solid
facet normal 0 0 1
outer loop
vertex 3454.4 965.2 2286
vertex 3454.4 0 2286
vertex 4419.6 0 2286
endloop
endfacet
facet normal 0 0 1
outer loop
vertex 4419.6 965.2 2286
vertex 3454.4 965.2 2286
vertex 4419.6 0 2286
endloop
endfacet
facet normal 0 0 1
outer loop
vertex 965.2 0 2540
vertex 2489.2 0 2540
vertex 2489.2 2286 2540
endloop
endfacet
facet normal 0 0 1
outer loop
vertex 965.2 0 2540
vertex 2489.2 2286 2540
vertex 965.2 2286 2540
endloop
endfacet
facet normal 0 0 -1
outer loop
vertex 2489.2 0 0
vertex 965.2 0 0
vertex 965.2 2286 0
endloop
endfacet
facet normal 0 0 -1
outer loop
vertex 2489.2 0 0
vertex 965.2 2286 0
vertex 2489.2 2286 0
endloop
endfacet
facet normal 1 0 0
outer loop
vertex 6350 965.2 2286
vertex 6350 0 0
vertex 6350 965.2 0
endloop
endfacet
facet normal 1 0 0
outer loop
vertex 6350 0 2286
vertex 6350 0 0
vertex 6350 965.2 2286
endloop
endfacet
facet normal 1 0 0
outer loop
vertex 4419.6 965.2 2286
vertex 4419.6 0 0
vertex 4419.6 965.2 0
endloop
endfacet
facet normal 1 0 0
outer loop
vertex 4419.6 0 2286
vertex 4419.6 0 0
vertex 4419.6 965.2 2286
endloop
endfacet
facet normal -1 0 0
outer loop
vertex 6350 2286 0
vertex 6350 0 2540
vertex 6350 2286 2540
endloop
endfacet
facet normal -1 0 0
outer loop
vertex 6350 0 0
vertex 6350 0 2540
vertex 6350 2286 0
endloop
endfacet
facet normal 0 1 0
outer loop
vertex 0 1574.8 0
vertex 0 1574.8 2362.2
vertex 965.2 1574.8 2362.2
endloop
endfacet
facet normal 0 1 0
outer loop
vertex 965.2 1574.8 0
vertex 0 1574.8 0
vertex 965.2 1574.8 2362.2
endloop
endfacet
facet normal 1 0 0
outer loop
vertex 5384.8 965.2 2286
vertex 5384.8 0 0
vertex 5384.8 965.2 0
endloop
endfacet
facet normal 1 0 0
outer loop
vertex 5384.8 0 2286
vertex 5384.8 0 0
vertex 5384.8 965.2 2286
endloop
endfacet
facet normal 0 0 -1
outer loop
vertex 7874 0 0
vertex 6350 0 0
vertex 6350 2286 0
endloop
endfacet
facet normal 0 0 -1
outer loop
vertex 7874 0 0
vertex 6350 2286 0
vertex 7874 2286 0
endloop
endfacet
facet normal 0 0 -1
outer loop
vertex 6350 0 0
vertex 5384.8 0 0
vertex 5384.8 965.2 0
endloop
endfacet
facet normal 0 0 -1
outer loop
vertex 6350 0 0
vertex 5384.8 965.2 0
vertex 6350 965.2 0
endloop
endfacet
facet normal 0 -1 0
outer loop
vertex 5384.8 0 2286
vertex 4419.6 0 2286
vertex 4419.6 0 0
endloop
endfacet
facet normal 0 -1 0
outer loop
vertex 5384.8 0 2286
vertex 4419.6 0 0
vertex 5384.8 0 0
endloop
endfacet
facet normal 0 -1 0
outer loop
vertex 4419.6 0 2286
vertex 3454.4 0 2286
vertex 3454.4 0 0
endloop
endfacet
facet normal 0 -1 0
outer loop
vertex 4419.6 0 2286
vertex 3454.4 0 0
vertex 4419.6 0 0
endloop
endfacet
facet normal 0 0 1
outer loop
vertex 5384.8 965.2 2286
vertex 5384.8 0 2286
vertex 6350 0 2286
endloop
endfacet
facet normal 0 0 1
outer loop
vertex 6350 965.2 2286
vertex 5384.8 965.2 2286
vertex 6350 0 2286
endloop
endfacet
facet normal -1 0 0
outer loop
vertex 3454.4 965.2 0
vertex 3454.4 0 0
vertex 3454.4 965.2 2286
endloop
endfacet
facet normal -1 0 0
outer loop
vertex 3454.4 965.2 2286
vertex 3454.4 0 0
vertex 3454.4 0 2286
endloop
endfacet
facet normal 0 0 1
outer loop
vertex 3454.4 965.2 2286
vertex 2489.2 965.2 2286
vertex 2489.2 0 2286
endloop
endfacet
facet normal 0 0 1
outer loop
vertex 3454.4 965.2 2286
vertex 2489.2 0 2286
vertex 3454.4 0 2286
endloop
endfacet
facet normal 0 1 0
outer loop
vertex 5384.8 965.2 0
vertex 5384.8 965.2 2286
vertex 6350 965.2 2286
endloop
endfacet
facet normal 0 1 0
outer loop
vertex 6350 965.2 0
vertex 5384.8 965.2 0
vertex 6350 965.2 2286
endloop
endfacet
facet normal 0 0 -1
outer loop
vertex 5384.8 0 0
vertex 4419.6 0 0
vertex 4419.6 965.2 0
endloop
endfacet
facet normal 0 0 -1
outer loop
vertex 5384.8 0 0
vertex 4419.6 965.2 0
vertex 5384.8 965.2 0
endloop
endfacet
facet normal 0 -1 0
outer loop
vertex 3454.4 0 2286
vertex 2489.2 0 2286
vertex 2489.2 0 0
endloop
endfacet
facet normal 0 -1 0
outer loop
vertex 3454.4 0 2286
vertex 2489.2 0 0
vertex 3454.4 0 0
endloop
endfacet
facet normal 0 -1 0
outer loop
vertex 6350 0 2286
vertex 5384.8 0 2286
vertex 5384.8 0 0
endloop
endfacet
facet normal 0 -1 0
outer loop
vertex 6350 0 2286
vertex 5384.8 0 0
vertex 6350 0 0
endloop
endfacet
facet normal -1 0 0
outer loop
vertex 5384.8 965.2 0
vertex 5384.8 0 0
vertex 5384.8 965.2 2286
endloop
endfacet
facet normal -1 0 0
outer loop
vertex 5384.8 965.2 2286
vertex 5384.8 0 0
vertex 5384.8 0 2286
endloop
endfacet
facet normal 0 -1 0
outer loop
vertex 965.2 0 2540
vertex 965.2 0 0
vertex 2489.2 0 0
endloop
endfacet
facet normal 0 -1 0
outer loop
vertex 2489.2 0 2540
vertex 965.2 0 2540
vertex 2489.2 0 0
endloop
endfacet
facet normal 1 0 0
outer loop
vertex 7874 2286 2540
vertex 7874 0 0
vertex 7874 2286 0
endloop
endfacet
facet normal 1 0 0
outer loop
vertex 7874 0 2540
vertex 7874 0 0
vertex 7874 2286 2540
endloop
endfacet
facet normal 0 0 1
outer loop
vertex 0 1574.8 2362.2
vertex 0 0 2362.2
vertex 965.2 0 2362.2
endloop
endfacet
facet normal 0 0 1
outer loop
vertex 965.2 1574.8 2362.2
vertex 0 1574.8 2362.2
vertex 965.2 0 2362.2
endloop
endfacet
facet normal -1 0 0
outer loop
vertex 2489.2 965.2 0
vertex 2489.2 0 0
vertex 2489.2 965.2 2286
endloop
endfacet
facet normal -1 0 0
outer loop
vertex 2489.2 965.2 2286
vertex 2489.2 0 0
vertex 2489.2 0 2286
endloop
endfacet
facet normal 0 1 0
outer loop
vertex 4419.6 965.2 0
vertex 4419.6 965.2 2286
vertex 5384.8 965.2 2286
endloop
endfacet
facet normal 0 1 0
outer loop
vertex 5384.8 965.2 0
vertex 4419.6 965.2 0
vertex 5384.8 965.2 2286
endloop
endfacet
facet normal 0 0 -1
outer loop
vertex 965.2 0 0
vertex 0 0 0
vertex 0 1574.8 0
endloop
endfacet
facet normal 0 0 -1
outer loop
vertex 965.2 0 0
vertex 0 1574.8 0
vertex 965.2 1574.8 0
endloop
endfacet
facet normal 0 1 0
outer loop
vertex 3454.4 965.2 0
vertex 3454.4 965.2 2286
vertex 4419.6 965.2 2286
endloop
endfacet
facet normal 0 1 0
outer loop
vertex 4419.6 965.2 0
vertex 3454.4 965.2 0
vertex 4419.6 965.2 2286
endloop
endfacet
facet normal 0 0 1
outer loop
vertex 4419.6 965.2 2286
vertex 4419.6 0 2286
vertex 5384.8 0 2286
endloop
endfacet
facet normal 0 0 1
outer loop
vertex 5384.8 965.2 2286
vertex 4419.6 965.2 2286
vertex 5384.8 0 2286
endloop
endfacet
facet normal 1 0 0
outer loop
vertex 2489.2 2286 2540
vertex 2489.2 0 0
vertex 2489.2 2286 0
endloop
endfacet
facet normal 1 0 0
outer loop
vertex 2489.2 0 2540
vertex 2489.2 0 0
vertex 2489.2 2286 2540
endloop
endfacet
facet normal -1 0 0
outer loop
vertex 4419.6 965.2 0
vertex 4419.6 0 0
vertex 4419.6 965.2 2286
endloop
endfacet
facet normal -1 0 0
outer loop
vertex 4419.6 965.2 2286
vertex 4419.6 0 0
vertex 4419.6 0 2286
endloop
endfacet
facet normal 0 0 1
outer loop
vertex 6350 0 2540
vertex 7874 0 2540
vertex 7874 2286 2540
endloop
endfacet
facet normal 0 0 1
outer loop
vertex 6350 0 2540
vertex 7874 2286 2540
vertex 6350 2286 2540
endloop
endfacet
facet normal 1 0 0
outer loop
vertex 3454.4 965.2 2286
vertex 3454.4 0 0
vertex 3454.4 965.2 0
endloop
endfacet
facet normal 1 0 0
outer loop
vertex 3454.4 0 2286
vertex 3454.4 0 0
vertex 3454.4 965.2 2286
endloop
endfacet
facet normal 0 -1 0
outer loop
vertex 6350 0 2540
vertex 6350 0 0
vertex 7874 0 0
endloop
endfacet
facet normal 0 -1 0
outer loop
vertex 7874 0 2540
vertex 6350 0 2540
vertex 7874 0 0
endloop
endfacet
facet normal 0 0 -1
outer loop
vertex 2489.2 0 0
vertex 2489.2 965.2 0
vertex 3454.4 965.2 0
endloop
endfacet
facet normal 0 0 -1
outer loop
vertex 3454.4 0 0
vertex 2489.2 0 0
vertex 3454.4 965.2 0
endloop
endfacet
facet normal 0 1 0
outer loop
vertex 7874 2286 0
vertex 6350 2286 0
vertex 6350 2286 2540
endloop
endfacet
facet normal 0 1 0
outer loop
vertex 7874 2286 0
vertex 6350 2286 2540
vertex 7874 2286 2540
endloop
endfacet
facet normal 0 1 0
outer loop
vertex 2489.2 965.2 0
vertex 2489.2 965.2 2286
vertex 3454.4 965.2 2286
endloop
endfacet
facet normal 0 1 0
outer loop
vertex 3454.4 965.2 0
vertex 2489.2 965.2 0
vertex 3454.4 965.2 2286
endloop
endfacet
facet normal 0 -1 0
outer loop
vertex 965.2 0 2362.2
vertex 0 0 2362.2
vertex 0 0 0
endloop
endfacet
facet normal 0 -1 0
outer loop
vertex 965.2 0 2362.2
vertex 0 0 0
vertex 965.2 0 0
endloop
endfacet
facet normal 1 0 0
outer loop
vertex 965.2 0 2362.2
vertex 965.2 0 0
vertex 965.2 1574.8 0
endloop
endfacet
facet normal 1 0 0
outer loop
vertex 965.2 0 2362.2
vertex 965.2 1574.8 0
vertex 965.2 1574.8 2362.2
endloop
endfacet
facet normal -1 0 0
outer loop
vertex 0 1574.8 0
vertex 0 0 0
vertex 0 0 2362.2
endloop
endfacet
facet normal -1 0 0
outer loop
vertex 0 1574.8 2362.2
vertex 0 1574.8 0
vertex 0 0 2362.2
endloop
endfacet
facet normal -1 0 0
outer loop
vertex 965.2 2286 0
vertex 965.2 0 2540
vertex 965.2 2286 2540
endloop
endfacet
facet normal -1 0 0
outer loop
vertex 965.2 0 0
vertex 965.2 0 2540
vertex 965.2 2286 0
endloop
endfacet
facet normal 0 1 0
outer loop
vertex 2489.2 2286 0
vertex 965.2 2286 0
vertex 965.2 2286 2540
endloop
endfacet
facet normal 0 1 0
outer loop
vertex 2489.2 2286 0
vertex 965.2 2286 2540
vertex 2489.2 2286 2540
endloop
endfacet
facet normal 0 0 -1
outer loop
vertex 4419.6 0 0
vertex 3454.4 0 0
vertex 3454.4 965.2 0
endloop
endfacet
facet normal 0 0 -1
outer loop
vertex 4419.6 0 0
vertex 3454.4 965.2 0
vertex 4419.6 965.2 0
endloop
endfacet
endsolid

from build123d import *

# Parameters (mm, degrees)
F0_W     = 965.2
F0_H     = 2362.2
F1_DEPTH = 1574.8
F2_DEPTH = 2286
F0_H_2   = 2286
F3_DEPTH = 965.2
F4_DEPTH = 965.2
F5_DEPTH = 965.2
F6_DEPTH = 965.2
F7_DEPTH = 2286


with BuildPart() as f1:
    # F0 (on Front) → F1 (new body)
    with BuildSketch(Plane.XZ):
        with Locations((482.6, 1181.1)):
            Rectangle(F0_W, F0_H)
    extrude(amount=-F1_DEPTH)


with BuildPart() as f2:
    # F0 (on Front) → F2 (new body)
    with BuildSketch(Plane.XZ):
        Polygon((965.2, 2362.2), (965.2, 0), (2489.2, 0), (2489.2, 2286), (2489.2, 2540), (965.2, 2540), align=None)
    extrude(amount=-F2_DEPTH)


with BuildPart() as f3:
    # F0 (on Front) → F3 (new body)
    with BuildSketch(Plane.XZ):
        with Locations((2971.8, 1143)):
            Rectangle(F0_W, F0_H_2)
    extrude(amount=-F3_DEPTH)


with BuildPart() as f4:
    # F0 (on Front) → F4 (new body)
    with BuildSketch(Plane.XZ):
        with Locations((3937, 1143)):
            Rectangle(F0_W, F0_H_2)
    extrude(amount=-F4_DEPTH)


with BuildPart() as f5:
    # F0 (on Front) → F5 (new body)
    with BuildSketch(Plane.XZ):
        with Locations((4902.2, 1143)):
            Rectangle(F0_W, F0_H_2)
    extrude(amount=-F5_DEPTH)


with BuildPart() as f6:
    # F0 (on Front) → F6 (new body)
    with BuildSketch(Plane.XZ):
        with Locations((5867.4, 1143)):
            Rectangle(F0_W, F0_H_2)
    extrude(amount=-F6_DEPTH)


with BuildPart() as f7:
    # F0 (on Front) → F7 (new body)
    with BuildSketch(Plane.XZ):
        Polygon((6350, 2286), (6350, 0), (7874, 0), (7874, 2540), (6350, 2540), align=None)
    extrude(amount=-F7_DEPTH)


solid = Compound([f1.part, f2.part, f3.part, f4.part, f5.part, f6.part, f7.part])
